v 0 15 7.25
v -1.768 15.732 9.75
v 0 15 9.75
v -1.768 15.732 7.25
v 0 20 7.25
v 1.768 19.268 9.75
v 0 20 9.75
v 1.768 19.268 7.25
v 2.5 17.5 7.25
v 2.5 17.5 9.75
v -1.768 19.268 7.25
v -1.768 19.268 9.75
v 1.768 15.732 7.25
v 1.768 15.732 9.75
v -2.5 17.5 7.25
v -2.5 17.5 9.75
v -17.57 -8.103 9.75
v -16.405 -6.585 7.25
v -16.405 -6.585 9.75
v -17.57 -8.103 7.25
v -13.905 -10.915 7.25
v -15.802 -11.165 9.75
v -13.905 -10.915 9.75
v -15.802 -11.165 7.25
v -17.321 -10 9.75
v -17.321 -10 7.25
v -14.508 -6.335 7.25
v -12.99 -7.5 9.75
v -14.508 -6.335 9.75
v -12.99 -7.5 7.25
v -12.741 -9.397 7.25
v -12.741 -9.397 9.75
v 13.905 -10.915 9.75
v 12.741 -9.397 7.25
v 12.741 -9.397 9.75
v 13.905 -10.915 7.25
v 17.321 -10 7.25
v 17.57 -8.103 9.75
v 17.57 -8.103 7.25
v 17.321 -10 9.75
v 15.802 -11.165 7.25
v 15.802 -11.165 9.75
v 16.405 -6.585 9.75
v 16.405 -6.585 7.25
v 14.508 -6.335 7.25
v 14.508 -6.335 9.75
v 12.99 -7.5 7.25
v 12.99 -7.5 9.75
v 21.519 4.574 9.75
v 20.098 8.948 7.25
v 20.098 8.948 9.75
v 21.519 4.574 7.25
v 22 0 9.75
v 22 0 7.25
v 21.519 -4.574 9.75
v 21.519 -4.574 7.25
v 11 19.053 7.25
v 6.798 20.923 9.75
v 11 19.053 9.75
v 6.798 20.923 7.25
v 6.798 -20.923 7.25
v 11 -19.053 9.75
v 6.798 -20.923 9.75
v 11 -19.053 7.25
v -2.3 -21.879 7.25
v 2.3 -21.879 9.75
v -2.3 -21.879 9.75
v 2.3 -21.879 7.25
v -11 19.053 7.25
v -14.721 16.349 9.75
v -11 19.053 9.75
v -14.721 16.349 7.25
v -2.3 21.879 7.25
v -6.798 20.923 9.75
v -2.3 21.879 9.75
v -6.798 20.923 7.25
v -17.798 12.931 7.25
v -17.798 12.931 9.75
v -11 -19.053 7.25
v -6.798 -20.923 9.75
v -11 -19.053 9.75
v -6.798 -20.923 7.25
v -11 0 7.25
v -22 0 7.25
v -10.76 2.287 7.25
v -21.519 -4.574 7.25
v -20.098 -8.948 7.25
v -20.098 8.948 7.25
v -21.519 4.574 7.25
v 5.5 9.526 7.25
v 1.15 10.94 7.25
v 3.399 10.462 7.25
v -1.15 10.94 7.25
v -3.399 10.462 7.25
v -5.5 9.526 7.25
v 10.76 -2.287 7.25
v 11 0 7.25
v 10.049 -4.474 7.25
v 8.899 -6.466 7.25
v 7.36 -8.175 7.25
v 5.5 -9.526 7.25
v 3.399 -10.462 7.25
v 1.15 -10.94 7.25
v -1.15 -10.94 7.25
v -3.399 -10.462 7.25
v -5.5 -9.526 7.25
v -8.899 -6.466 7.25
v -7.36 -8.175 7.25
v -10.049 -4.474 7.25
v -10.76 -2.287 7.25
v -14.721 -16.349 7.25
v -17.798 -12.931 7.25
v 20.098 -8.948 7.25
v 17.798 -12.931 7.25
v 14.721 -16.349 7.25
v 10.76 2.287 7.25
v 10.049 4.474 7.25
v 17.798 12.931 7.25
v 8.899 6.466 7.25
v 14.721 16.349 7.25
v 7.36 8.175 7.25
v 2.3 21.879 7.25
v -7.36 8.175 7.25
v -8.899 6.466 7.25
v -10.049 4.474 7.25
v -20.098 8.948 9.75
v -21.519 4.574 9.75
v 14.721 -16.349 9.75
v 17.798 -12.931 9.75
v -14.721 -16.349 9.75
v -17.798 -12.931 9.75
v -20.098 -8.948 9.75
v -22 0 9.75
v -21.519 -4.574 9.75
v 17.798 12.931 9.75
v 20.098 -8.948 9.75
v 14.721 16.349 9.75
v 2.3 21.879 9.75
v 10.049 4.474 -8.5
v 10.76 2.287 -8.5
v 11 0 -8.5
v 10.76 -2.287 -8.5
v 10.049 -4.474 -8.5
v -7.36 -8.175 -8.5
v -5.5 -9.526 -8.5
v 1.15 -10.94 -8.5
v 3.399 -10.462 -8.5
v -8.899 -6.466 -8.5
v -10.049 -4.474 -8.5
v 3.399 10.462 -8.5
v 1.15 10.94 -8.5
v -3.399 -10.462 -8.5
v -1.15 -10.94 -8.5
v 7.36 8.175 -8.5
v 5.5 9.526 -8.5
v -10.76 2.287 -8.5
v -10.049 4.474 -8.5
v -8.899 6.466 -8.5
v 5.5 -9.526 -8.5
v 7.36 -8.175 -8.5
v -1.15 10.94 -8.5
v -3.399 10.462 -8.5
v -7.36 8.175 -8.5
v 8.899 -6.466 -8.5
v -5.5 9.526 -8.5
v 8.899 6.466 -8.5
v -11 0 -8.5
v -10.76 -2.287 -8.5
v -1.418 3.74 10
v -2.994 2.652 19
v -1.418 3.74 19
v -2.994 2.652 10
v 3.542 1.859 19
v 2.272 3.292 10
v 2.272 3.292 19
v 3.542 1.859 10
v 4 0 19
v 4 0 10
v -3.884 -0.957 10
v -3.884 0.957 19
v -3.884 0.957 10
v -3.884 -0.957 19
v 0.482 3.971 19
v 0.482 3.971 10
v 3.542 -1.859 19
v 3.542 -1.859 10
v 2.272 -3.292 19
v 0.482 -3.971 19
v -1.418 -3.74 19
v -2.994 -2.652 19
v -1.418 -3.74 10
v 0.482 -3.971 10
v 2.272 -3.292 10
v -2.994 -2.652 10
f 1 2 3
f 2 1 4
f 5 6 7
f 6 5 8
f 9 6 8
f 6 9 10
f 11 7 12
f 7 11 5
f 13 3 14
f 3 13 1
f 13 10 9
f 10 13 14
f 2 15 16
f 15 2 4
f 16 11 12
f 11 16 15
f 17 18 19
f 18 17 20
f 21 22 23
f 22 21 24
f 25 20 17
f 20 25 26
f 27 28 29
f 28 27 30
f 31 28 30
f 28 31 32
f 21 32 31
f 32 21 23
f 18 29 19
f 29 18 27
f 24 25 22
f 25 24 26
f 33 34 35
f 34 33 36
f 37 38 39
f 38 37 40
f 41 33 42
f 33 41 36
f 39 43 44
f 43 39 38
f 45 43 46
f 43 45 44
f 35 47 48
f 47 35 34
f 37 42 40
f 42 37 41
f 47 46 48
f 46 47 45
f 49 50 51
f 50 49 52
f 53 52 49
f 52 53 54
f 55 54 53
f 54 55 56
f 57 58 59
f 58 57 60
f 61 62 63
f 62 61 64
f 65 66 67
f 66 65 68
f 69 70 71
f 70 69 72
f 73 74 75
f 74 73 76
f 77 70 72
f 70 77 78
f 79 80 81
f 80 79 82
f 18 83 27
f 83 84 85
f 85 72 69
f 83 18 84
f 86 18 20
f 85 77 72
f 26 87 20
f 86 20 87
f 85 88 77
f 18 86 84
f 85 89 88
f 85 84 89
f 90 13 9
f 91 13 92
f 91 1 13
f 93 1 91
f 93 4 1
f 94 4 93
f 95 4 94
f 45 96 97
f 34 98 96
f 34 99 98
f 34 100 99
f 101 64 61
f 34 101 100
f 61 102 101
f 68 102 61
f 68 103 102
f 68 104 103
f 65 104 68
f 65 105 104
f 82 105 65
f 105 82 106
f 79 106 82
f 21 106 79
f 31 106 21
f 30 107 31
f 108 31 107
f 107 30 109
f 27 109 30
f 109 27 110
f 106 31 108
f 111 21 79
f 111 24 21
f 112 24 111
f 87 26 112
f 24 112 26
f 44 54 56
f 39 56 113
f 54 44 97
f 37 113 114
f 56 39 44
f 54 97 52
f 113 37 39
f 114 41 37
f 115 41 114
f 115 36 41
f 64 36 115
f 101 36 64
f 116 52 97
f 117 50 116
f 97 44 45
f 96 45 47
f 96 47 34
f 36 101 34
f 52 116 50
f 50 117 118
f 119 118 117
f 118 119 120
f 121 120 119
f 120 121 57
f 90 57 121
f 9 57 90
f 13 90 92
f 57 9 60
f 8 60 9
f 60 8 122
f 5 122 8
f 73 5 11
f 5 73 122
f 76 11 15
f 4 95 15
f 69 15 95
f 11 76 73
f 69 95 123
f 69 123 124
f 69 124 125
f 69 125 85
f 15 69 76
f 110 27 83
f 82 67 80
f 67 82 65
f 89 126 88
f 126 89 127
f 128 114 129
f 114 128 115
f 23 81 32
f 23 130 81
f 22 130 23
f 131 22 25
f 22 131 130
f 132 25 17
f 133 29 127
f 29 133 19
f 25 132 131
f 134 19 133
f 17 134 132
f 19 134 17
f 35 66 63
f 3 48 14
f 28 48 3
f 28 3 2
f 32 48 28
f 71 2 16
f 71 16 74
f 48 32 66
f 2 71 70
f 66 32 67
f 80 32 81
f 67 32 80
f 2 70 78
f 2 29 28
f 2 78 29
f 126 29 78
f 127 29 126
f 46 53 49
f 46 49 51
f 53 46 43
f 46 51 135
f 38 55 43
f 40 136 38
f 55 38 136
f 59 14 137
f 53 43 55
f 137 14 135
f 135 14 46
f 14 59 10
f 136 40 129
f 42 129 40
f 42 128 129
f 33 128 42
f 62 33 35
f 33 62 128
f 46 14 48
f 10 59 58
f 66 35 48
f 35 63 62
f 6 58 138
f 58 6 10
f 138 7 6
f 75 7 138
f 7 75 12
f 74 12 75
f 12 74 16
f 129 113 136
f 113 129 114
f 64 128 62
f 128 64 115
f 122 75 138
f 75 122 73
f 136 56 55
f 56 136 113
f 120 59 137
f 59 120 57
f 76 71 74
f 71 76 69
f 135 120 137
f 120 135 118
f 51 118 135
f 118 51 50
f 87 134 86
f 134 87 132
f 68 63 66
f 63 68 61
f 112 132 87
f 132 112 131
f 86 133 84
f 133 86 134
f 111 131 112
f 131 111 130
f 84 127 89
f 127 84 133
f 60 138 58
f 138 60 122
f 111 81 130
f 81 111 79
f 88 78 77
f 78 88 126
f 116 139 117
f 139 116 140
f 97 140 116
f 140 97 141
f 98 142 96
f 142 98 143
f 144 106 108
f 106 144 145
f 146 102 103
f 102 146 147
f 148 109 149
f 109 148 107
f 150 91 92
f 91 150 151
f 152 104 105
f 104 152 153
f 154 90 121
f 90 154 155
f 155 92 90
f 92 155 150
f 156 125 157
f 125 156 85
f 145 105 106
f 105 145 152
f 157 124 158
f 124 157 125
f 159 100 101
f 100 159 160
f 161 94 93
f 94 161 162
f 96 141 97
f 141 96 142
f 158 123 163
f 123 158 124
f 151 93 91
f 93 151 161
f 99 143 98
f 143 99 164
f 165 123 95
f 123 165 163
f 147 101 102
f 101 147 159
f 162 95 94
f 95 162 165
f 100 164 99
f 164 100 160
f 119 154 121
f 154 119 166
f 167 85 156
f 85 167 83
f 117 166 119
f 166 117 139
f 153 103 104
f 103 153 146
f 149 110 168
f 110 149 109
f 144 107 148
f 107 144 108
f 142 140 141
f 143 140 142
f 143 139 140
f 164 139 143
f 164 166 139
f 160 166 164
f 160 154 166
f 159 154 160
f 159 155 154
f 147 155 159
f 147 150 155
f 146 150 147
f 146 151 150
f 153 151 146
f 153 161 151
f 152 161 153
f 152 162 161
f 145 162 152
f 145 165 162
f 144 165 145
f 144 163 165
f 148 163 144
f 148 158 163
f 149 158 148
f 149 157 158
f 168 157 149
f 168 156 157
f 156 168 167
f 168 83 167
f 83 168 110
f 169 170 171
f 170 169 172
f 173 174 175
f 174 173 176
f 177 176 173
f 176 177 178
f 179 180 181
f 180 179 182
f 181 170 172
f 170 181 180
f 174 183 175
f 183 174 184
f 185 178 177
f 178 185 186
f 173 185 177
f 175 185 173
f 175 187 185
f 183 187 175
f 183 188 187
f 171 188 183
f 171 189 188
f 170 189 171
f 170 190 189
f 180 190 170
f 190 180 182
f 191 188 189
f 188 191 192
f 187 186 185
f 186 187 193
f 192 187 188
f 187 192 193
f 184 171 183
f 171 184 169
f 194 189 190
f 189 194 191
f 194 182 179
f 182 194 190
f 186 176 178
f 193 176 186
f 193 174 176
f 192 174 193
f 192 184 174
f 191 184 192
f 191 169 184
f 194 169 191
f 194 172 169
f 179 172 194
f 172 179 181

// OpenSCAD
/*
	Slip Ring, written in OpenScad by Skippy - http://philipmcgaw.com
	
	Adafruit Slip Ring with Flange (22 mm diameter, 6 wires, max 2 A @ 240 V). http://adafruit.com/product/736

	This work is licensed under the Creative Commons Attribution-NonCommercial-ShareAlike 4.0 International License. To view a copy of this license, visit http://creativecommons.org/licenses/by-nc-sa/4.0/.
*/

// Things to Use

// Variables

module slipRing() 
{
	// Main Body
	cylinder(d = 22, h = 17, center = true);
	// collate
	translate([0,0,8.5])
	{
		difference()
		{
			cylinder(d = 44, h = 2.5, center = true);
			// Mounting Holes.
			for (i = [0 : 2])
			{
				rotate(i * 360 / 3)
				translate([0, 44/2 - 4.5, 0])
				cylinder(h = 3, d = 5, center=true);
			}
		}
	}
	// Inside Body
	translate([0,0,14.5])
	cylinder(d = 8, h = 9, center = true);
}

slipRing();
